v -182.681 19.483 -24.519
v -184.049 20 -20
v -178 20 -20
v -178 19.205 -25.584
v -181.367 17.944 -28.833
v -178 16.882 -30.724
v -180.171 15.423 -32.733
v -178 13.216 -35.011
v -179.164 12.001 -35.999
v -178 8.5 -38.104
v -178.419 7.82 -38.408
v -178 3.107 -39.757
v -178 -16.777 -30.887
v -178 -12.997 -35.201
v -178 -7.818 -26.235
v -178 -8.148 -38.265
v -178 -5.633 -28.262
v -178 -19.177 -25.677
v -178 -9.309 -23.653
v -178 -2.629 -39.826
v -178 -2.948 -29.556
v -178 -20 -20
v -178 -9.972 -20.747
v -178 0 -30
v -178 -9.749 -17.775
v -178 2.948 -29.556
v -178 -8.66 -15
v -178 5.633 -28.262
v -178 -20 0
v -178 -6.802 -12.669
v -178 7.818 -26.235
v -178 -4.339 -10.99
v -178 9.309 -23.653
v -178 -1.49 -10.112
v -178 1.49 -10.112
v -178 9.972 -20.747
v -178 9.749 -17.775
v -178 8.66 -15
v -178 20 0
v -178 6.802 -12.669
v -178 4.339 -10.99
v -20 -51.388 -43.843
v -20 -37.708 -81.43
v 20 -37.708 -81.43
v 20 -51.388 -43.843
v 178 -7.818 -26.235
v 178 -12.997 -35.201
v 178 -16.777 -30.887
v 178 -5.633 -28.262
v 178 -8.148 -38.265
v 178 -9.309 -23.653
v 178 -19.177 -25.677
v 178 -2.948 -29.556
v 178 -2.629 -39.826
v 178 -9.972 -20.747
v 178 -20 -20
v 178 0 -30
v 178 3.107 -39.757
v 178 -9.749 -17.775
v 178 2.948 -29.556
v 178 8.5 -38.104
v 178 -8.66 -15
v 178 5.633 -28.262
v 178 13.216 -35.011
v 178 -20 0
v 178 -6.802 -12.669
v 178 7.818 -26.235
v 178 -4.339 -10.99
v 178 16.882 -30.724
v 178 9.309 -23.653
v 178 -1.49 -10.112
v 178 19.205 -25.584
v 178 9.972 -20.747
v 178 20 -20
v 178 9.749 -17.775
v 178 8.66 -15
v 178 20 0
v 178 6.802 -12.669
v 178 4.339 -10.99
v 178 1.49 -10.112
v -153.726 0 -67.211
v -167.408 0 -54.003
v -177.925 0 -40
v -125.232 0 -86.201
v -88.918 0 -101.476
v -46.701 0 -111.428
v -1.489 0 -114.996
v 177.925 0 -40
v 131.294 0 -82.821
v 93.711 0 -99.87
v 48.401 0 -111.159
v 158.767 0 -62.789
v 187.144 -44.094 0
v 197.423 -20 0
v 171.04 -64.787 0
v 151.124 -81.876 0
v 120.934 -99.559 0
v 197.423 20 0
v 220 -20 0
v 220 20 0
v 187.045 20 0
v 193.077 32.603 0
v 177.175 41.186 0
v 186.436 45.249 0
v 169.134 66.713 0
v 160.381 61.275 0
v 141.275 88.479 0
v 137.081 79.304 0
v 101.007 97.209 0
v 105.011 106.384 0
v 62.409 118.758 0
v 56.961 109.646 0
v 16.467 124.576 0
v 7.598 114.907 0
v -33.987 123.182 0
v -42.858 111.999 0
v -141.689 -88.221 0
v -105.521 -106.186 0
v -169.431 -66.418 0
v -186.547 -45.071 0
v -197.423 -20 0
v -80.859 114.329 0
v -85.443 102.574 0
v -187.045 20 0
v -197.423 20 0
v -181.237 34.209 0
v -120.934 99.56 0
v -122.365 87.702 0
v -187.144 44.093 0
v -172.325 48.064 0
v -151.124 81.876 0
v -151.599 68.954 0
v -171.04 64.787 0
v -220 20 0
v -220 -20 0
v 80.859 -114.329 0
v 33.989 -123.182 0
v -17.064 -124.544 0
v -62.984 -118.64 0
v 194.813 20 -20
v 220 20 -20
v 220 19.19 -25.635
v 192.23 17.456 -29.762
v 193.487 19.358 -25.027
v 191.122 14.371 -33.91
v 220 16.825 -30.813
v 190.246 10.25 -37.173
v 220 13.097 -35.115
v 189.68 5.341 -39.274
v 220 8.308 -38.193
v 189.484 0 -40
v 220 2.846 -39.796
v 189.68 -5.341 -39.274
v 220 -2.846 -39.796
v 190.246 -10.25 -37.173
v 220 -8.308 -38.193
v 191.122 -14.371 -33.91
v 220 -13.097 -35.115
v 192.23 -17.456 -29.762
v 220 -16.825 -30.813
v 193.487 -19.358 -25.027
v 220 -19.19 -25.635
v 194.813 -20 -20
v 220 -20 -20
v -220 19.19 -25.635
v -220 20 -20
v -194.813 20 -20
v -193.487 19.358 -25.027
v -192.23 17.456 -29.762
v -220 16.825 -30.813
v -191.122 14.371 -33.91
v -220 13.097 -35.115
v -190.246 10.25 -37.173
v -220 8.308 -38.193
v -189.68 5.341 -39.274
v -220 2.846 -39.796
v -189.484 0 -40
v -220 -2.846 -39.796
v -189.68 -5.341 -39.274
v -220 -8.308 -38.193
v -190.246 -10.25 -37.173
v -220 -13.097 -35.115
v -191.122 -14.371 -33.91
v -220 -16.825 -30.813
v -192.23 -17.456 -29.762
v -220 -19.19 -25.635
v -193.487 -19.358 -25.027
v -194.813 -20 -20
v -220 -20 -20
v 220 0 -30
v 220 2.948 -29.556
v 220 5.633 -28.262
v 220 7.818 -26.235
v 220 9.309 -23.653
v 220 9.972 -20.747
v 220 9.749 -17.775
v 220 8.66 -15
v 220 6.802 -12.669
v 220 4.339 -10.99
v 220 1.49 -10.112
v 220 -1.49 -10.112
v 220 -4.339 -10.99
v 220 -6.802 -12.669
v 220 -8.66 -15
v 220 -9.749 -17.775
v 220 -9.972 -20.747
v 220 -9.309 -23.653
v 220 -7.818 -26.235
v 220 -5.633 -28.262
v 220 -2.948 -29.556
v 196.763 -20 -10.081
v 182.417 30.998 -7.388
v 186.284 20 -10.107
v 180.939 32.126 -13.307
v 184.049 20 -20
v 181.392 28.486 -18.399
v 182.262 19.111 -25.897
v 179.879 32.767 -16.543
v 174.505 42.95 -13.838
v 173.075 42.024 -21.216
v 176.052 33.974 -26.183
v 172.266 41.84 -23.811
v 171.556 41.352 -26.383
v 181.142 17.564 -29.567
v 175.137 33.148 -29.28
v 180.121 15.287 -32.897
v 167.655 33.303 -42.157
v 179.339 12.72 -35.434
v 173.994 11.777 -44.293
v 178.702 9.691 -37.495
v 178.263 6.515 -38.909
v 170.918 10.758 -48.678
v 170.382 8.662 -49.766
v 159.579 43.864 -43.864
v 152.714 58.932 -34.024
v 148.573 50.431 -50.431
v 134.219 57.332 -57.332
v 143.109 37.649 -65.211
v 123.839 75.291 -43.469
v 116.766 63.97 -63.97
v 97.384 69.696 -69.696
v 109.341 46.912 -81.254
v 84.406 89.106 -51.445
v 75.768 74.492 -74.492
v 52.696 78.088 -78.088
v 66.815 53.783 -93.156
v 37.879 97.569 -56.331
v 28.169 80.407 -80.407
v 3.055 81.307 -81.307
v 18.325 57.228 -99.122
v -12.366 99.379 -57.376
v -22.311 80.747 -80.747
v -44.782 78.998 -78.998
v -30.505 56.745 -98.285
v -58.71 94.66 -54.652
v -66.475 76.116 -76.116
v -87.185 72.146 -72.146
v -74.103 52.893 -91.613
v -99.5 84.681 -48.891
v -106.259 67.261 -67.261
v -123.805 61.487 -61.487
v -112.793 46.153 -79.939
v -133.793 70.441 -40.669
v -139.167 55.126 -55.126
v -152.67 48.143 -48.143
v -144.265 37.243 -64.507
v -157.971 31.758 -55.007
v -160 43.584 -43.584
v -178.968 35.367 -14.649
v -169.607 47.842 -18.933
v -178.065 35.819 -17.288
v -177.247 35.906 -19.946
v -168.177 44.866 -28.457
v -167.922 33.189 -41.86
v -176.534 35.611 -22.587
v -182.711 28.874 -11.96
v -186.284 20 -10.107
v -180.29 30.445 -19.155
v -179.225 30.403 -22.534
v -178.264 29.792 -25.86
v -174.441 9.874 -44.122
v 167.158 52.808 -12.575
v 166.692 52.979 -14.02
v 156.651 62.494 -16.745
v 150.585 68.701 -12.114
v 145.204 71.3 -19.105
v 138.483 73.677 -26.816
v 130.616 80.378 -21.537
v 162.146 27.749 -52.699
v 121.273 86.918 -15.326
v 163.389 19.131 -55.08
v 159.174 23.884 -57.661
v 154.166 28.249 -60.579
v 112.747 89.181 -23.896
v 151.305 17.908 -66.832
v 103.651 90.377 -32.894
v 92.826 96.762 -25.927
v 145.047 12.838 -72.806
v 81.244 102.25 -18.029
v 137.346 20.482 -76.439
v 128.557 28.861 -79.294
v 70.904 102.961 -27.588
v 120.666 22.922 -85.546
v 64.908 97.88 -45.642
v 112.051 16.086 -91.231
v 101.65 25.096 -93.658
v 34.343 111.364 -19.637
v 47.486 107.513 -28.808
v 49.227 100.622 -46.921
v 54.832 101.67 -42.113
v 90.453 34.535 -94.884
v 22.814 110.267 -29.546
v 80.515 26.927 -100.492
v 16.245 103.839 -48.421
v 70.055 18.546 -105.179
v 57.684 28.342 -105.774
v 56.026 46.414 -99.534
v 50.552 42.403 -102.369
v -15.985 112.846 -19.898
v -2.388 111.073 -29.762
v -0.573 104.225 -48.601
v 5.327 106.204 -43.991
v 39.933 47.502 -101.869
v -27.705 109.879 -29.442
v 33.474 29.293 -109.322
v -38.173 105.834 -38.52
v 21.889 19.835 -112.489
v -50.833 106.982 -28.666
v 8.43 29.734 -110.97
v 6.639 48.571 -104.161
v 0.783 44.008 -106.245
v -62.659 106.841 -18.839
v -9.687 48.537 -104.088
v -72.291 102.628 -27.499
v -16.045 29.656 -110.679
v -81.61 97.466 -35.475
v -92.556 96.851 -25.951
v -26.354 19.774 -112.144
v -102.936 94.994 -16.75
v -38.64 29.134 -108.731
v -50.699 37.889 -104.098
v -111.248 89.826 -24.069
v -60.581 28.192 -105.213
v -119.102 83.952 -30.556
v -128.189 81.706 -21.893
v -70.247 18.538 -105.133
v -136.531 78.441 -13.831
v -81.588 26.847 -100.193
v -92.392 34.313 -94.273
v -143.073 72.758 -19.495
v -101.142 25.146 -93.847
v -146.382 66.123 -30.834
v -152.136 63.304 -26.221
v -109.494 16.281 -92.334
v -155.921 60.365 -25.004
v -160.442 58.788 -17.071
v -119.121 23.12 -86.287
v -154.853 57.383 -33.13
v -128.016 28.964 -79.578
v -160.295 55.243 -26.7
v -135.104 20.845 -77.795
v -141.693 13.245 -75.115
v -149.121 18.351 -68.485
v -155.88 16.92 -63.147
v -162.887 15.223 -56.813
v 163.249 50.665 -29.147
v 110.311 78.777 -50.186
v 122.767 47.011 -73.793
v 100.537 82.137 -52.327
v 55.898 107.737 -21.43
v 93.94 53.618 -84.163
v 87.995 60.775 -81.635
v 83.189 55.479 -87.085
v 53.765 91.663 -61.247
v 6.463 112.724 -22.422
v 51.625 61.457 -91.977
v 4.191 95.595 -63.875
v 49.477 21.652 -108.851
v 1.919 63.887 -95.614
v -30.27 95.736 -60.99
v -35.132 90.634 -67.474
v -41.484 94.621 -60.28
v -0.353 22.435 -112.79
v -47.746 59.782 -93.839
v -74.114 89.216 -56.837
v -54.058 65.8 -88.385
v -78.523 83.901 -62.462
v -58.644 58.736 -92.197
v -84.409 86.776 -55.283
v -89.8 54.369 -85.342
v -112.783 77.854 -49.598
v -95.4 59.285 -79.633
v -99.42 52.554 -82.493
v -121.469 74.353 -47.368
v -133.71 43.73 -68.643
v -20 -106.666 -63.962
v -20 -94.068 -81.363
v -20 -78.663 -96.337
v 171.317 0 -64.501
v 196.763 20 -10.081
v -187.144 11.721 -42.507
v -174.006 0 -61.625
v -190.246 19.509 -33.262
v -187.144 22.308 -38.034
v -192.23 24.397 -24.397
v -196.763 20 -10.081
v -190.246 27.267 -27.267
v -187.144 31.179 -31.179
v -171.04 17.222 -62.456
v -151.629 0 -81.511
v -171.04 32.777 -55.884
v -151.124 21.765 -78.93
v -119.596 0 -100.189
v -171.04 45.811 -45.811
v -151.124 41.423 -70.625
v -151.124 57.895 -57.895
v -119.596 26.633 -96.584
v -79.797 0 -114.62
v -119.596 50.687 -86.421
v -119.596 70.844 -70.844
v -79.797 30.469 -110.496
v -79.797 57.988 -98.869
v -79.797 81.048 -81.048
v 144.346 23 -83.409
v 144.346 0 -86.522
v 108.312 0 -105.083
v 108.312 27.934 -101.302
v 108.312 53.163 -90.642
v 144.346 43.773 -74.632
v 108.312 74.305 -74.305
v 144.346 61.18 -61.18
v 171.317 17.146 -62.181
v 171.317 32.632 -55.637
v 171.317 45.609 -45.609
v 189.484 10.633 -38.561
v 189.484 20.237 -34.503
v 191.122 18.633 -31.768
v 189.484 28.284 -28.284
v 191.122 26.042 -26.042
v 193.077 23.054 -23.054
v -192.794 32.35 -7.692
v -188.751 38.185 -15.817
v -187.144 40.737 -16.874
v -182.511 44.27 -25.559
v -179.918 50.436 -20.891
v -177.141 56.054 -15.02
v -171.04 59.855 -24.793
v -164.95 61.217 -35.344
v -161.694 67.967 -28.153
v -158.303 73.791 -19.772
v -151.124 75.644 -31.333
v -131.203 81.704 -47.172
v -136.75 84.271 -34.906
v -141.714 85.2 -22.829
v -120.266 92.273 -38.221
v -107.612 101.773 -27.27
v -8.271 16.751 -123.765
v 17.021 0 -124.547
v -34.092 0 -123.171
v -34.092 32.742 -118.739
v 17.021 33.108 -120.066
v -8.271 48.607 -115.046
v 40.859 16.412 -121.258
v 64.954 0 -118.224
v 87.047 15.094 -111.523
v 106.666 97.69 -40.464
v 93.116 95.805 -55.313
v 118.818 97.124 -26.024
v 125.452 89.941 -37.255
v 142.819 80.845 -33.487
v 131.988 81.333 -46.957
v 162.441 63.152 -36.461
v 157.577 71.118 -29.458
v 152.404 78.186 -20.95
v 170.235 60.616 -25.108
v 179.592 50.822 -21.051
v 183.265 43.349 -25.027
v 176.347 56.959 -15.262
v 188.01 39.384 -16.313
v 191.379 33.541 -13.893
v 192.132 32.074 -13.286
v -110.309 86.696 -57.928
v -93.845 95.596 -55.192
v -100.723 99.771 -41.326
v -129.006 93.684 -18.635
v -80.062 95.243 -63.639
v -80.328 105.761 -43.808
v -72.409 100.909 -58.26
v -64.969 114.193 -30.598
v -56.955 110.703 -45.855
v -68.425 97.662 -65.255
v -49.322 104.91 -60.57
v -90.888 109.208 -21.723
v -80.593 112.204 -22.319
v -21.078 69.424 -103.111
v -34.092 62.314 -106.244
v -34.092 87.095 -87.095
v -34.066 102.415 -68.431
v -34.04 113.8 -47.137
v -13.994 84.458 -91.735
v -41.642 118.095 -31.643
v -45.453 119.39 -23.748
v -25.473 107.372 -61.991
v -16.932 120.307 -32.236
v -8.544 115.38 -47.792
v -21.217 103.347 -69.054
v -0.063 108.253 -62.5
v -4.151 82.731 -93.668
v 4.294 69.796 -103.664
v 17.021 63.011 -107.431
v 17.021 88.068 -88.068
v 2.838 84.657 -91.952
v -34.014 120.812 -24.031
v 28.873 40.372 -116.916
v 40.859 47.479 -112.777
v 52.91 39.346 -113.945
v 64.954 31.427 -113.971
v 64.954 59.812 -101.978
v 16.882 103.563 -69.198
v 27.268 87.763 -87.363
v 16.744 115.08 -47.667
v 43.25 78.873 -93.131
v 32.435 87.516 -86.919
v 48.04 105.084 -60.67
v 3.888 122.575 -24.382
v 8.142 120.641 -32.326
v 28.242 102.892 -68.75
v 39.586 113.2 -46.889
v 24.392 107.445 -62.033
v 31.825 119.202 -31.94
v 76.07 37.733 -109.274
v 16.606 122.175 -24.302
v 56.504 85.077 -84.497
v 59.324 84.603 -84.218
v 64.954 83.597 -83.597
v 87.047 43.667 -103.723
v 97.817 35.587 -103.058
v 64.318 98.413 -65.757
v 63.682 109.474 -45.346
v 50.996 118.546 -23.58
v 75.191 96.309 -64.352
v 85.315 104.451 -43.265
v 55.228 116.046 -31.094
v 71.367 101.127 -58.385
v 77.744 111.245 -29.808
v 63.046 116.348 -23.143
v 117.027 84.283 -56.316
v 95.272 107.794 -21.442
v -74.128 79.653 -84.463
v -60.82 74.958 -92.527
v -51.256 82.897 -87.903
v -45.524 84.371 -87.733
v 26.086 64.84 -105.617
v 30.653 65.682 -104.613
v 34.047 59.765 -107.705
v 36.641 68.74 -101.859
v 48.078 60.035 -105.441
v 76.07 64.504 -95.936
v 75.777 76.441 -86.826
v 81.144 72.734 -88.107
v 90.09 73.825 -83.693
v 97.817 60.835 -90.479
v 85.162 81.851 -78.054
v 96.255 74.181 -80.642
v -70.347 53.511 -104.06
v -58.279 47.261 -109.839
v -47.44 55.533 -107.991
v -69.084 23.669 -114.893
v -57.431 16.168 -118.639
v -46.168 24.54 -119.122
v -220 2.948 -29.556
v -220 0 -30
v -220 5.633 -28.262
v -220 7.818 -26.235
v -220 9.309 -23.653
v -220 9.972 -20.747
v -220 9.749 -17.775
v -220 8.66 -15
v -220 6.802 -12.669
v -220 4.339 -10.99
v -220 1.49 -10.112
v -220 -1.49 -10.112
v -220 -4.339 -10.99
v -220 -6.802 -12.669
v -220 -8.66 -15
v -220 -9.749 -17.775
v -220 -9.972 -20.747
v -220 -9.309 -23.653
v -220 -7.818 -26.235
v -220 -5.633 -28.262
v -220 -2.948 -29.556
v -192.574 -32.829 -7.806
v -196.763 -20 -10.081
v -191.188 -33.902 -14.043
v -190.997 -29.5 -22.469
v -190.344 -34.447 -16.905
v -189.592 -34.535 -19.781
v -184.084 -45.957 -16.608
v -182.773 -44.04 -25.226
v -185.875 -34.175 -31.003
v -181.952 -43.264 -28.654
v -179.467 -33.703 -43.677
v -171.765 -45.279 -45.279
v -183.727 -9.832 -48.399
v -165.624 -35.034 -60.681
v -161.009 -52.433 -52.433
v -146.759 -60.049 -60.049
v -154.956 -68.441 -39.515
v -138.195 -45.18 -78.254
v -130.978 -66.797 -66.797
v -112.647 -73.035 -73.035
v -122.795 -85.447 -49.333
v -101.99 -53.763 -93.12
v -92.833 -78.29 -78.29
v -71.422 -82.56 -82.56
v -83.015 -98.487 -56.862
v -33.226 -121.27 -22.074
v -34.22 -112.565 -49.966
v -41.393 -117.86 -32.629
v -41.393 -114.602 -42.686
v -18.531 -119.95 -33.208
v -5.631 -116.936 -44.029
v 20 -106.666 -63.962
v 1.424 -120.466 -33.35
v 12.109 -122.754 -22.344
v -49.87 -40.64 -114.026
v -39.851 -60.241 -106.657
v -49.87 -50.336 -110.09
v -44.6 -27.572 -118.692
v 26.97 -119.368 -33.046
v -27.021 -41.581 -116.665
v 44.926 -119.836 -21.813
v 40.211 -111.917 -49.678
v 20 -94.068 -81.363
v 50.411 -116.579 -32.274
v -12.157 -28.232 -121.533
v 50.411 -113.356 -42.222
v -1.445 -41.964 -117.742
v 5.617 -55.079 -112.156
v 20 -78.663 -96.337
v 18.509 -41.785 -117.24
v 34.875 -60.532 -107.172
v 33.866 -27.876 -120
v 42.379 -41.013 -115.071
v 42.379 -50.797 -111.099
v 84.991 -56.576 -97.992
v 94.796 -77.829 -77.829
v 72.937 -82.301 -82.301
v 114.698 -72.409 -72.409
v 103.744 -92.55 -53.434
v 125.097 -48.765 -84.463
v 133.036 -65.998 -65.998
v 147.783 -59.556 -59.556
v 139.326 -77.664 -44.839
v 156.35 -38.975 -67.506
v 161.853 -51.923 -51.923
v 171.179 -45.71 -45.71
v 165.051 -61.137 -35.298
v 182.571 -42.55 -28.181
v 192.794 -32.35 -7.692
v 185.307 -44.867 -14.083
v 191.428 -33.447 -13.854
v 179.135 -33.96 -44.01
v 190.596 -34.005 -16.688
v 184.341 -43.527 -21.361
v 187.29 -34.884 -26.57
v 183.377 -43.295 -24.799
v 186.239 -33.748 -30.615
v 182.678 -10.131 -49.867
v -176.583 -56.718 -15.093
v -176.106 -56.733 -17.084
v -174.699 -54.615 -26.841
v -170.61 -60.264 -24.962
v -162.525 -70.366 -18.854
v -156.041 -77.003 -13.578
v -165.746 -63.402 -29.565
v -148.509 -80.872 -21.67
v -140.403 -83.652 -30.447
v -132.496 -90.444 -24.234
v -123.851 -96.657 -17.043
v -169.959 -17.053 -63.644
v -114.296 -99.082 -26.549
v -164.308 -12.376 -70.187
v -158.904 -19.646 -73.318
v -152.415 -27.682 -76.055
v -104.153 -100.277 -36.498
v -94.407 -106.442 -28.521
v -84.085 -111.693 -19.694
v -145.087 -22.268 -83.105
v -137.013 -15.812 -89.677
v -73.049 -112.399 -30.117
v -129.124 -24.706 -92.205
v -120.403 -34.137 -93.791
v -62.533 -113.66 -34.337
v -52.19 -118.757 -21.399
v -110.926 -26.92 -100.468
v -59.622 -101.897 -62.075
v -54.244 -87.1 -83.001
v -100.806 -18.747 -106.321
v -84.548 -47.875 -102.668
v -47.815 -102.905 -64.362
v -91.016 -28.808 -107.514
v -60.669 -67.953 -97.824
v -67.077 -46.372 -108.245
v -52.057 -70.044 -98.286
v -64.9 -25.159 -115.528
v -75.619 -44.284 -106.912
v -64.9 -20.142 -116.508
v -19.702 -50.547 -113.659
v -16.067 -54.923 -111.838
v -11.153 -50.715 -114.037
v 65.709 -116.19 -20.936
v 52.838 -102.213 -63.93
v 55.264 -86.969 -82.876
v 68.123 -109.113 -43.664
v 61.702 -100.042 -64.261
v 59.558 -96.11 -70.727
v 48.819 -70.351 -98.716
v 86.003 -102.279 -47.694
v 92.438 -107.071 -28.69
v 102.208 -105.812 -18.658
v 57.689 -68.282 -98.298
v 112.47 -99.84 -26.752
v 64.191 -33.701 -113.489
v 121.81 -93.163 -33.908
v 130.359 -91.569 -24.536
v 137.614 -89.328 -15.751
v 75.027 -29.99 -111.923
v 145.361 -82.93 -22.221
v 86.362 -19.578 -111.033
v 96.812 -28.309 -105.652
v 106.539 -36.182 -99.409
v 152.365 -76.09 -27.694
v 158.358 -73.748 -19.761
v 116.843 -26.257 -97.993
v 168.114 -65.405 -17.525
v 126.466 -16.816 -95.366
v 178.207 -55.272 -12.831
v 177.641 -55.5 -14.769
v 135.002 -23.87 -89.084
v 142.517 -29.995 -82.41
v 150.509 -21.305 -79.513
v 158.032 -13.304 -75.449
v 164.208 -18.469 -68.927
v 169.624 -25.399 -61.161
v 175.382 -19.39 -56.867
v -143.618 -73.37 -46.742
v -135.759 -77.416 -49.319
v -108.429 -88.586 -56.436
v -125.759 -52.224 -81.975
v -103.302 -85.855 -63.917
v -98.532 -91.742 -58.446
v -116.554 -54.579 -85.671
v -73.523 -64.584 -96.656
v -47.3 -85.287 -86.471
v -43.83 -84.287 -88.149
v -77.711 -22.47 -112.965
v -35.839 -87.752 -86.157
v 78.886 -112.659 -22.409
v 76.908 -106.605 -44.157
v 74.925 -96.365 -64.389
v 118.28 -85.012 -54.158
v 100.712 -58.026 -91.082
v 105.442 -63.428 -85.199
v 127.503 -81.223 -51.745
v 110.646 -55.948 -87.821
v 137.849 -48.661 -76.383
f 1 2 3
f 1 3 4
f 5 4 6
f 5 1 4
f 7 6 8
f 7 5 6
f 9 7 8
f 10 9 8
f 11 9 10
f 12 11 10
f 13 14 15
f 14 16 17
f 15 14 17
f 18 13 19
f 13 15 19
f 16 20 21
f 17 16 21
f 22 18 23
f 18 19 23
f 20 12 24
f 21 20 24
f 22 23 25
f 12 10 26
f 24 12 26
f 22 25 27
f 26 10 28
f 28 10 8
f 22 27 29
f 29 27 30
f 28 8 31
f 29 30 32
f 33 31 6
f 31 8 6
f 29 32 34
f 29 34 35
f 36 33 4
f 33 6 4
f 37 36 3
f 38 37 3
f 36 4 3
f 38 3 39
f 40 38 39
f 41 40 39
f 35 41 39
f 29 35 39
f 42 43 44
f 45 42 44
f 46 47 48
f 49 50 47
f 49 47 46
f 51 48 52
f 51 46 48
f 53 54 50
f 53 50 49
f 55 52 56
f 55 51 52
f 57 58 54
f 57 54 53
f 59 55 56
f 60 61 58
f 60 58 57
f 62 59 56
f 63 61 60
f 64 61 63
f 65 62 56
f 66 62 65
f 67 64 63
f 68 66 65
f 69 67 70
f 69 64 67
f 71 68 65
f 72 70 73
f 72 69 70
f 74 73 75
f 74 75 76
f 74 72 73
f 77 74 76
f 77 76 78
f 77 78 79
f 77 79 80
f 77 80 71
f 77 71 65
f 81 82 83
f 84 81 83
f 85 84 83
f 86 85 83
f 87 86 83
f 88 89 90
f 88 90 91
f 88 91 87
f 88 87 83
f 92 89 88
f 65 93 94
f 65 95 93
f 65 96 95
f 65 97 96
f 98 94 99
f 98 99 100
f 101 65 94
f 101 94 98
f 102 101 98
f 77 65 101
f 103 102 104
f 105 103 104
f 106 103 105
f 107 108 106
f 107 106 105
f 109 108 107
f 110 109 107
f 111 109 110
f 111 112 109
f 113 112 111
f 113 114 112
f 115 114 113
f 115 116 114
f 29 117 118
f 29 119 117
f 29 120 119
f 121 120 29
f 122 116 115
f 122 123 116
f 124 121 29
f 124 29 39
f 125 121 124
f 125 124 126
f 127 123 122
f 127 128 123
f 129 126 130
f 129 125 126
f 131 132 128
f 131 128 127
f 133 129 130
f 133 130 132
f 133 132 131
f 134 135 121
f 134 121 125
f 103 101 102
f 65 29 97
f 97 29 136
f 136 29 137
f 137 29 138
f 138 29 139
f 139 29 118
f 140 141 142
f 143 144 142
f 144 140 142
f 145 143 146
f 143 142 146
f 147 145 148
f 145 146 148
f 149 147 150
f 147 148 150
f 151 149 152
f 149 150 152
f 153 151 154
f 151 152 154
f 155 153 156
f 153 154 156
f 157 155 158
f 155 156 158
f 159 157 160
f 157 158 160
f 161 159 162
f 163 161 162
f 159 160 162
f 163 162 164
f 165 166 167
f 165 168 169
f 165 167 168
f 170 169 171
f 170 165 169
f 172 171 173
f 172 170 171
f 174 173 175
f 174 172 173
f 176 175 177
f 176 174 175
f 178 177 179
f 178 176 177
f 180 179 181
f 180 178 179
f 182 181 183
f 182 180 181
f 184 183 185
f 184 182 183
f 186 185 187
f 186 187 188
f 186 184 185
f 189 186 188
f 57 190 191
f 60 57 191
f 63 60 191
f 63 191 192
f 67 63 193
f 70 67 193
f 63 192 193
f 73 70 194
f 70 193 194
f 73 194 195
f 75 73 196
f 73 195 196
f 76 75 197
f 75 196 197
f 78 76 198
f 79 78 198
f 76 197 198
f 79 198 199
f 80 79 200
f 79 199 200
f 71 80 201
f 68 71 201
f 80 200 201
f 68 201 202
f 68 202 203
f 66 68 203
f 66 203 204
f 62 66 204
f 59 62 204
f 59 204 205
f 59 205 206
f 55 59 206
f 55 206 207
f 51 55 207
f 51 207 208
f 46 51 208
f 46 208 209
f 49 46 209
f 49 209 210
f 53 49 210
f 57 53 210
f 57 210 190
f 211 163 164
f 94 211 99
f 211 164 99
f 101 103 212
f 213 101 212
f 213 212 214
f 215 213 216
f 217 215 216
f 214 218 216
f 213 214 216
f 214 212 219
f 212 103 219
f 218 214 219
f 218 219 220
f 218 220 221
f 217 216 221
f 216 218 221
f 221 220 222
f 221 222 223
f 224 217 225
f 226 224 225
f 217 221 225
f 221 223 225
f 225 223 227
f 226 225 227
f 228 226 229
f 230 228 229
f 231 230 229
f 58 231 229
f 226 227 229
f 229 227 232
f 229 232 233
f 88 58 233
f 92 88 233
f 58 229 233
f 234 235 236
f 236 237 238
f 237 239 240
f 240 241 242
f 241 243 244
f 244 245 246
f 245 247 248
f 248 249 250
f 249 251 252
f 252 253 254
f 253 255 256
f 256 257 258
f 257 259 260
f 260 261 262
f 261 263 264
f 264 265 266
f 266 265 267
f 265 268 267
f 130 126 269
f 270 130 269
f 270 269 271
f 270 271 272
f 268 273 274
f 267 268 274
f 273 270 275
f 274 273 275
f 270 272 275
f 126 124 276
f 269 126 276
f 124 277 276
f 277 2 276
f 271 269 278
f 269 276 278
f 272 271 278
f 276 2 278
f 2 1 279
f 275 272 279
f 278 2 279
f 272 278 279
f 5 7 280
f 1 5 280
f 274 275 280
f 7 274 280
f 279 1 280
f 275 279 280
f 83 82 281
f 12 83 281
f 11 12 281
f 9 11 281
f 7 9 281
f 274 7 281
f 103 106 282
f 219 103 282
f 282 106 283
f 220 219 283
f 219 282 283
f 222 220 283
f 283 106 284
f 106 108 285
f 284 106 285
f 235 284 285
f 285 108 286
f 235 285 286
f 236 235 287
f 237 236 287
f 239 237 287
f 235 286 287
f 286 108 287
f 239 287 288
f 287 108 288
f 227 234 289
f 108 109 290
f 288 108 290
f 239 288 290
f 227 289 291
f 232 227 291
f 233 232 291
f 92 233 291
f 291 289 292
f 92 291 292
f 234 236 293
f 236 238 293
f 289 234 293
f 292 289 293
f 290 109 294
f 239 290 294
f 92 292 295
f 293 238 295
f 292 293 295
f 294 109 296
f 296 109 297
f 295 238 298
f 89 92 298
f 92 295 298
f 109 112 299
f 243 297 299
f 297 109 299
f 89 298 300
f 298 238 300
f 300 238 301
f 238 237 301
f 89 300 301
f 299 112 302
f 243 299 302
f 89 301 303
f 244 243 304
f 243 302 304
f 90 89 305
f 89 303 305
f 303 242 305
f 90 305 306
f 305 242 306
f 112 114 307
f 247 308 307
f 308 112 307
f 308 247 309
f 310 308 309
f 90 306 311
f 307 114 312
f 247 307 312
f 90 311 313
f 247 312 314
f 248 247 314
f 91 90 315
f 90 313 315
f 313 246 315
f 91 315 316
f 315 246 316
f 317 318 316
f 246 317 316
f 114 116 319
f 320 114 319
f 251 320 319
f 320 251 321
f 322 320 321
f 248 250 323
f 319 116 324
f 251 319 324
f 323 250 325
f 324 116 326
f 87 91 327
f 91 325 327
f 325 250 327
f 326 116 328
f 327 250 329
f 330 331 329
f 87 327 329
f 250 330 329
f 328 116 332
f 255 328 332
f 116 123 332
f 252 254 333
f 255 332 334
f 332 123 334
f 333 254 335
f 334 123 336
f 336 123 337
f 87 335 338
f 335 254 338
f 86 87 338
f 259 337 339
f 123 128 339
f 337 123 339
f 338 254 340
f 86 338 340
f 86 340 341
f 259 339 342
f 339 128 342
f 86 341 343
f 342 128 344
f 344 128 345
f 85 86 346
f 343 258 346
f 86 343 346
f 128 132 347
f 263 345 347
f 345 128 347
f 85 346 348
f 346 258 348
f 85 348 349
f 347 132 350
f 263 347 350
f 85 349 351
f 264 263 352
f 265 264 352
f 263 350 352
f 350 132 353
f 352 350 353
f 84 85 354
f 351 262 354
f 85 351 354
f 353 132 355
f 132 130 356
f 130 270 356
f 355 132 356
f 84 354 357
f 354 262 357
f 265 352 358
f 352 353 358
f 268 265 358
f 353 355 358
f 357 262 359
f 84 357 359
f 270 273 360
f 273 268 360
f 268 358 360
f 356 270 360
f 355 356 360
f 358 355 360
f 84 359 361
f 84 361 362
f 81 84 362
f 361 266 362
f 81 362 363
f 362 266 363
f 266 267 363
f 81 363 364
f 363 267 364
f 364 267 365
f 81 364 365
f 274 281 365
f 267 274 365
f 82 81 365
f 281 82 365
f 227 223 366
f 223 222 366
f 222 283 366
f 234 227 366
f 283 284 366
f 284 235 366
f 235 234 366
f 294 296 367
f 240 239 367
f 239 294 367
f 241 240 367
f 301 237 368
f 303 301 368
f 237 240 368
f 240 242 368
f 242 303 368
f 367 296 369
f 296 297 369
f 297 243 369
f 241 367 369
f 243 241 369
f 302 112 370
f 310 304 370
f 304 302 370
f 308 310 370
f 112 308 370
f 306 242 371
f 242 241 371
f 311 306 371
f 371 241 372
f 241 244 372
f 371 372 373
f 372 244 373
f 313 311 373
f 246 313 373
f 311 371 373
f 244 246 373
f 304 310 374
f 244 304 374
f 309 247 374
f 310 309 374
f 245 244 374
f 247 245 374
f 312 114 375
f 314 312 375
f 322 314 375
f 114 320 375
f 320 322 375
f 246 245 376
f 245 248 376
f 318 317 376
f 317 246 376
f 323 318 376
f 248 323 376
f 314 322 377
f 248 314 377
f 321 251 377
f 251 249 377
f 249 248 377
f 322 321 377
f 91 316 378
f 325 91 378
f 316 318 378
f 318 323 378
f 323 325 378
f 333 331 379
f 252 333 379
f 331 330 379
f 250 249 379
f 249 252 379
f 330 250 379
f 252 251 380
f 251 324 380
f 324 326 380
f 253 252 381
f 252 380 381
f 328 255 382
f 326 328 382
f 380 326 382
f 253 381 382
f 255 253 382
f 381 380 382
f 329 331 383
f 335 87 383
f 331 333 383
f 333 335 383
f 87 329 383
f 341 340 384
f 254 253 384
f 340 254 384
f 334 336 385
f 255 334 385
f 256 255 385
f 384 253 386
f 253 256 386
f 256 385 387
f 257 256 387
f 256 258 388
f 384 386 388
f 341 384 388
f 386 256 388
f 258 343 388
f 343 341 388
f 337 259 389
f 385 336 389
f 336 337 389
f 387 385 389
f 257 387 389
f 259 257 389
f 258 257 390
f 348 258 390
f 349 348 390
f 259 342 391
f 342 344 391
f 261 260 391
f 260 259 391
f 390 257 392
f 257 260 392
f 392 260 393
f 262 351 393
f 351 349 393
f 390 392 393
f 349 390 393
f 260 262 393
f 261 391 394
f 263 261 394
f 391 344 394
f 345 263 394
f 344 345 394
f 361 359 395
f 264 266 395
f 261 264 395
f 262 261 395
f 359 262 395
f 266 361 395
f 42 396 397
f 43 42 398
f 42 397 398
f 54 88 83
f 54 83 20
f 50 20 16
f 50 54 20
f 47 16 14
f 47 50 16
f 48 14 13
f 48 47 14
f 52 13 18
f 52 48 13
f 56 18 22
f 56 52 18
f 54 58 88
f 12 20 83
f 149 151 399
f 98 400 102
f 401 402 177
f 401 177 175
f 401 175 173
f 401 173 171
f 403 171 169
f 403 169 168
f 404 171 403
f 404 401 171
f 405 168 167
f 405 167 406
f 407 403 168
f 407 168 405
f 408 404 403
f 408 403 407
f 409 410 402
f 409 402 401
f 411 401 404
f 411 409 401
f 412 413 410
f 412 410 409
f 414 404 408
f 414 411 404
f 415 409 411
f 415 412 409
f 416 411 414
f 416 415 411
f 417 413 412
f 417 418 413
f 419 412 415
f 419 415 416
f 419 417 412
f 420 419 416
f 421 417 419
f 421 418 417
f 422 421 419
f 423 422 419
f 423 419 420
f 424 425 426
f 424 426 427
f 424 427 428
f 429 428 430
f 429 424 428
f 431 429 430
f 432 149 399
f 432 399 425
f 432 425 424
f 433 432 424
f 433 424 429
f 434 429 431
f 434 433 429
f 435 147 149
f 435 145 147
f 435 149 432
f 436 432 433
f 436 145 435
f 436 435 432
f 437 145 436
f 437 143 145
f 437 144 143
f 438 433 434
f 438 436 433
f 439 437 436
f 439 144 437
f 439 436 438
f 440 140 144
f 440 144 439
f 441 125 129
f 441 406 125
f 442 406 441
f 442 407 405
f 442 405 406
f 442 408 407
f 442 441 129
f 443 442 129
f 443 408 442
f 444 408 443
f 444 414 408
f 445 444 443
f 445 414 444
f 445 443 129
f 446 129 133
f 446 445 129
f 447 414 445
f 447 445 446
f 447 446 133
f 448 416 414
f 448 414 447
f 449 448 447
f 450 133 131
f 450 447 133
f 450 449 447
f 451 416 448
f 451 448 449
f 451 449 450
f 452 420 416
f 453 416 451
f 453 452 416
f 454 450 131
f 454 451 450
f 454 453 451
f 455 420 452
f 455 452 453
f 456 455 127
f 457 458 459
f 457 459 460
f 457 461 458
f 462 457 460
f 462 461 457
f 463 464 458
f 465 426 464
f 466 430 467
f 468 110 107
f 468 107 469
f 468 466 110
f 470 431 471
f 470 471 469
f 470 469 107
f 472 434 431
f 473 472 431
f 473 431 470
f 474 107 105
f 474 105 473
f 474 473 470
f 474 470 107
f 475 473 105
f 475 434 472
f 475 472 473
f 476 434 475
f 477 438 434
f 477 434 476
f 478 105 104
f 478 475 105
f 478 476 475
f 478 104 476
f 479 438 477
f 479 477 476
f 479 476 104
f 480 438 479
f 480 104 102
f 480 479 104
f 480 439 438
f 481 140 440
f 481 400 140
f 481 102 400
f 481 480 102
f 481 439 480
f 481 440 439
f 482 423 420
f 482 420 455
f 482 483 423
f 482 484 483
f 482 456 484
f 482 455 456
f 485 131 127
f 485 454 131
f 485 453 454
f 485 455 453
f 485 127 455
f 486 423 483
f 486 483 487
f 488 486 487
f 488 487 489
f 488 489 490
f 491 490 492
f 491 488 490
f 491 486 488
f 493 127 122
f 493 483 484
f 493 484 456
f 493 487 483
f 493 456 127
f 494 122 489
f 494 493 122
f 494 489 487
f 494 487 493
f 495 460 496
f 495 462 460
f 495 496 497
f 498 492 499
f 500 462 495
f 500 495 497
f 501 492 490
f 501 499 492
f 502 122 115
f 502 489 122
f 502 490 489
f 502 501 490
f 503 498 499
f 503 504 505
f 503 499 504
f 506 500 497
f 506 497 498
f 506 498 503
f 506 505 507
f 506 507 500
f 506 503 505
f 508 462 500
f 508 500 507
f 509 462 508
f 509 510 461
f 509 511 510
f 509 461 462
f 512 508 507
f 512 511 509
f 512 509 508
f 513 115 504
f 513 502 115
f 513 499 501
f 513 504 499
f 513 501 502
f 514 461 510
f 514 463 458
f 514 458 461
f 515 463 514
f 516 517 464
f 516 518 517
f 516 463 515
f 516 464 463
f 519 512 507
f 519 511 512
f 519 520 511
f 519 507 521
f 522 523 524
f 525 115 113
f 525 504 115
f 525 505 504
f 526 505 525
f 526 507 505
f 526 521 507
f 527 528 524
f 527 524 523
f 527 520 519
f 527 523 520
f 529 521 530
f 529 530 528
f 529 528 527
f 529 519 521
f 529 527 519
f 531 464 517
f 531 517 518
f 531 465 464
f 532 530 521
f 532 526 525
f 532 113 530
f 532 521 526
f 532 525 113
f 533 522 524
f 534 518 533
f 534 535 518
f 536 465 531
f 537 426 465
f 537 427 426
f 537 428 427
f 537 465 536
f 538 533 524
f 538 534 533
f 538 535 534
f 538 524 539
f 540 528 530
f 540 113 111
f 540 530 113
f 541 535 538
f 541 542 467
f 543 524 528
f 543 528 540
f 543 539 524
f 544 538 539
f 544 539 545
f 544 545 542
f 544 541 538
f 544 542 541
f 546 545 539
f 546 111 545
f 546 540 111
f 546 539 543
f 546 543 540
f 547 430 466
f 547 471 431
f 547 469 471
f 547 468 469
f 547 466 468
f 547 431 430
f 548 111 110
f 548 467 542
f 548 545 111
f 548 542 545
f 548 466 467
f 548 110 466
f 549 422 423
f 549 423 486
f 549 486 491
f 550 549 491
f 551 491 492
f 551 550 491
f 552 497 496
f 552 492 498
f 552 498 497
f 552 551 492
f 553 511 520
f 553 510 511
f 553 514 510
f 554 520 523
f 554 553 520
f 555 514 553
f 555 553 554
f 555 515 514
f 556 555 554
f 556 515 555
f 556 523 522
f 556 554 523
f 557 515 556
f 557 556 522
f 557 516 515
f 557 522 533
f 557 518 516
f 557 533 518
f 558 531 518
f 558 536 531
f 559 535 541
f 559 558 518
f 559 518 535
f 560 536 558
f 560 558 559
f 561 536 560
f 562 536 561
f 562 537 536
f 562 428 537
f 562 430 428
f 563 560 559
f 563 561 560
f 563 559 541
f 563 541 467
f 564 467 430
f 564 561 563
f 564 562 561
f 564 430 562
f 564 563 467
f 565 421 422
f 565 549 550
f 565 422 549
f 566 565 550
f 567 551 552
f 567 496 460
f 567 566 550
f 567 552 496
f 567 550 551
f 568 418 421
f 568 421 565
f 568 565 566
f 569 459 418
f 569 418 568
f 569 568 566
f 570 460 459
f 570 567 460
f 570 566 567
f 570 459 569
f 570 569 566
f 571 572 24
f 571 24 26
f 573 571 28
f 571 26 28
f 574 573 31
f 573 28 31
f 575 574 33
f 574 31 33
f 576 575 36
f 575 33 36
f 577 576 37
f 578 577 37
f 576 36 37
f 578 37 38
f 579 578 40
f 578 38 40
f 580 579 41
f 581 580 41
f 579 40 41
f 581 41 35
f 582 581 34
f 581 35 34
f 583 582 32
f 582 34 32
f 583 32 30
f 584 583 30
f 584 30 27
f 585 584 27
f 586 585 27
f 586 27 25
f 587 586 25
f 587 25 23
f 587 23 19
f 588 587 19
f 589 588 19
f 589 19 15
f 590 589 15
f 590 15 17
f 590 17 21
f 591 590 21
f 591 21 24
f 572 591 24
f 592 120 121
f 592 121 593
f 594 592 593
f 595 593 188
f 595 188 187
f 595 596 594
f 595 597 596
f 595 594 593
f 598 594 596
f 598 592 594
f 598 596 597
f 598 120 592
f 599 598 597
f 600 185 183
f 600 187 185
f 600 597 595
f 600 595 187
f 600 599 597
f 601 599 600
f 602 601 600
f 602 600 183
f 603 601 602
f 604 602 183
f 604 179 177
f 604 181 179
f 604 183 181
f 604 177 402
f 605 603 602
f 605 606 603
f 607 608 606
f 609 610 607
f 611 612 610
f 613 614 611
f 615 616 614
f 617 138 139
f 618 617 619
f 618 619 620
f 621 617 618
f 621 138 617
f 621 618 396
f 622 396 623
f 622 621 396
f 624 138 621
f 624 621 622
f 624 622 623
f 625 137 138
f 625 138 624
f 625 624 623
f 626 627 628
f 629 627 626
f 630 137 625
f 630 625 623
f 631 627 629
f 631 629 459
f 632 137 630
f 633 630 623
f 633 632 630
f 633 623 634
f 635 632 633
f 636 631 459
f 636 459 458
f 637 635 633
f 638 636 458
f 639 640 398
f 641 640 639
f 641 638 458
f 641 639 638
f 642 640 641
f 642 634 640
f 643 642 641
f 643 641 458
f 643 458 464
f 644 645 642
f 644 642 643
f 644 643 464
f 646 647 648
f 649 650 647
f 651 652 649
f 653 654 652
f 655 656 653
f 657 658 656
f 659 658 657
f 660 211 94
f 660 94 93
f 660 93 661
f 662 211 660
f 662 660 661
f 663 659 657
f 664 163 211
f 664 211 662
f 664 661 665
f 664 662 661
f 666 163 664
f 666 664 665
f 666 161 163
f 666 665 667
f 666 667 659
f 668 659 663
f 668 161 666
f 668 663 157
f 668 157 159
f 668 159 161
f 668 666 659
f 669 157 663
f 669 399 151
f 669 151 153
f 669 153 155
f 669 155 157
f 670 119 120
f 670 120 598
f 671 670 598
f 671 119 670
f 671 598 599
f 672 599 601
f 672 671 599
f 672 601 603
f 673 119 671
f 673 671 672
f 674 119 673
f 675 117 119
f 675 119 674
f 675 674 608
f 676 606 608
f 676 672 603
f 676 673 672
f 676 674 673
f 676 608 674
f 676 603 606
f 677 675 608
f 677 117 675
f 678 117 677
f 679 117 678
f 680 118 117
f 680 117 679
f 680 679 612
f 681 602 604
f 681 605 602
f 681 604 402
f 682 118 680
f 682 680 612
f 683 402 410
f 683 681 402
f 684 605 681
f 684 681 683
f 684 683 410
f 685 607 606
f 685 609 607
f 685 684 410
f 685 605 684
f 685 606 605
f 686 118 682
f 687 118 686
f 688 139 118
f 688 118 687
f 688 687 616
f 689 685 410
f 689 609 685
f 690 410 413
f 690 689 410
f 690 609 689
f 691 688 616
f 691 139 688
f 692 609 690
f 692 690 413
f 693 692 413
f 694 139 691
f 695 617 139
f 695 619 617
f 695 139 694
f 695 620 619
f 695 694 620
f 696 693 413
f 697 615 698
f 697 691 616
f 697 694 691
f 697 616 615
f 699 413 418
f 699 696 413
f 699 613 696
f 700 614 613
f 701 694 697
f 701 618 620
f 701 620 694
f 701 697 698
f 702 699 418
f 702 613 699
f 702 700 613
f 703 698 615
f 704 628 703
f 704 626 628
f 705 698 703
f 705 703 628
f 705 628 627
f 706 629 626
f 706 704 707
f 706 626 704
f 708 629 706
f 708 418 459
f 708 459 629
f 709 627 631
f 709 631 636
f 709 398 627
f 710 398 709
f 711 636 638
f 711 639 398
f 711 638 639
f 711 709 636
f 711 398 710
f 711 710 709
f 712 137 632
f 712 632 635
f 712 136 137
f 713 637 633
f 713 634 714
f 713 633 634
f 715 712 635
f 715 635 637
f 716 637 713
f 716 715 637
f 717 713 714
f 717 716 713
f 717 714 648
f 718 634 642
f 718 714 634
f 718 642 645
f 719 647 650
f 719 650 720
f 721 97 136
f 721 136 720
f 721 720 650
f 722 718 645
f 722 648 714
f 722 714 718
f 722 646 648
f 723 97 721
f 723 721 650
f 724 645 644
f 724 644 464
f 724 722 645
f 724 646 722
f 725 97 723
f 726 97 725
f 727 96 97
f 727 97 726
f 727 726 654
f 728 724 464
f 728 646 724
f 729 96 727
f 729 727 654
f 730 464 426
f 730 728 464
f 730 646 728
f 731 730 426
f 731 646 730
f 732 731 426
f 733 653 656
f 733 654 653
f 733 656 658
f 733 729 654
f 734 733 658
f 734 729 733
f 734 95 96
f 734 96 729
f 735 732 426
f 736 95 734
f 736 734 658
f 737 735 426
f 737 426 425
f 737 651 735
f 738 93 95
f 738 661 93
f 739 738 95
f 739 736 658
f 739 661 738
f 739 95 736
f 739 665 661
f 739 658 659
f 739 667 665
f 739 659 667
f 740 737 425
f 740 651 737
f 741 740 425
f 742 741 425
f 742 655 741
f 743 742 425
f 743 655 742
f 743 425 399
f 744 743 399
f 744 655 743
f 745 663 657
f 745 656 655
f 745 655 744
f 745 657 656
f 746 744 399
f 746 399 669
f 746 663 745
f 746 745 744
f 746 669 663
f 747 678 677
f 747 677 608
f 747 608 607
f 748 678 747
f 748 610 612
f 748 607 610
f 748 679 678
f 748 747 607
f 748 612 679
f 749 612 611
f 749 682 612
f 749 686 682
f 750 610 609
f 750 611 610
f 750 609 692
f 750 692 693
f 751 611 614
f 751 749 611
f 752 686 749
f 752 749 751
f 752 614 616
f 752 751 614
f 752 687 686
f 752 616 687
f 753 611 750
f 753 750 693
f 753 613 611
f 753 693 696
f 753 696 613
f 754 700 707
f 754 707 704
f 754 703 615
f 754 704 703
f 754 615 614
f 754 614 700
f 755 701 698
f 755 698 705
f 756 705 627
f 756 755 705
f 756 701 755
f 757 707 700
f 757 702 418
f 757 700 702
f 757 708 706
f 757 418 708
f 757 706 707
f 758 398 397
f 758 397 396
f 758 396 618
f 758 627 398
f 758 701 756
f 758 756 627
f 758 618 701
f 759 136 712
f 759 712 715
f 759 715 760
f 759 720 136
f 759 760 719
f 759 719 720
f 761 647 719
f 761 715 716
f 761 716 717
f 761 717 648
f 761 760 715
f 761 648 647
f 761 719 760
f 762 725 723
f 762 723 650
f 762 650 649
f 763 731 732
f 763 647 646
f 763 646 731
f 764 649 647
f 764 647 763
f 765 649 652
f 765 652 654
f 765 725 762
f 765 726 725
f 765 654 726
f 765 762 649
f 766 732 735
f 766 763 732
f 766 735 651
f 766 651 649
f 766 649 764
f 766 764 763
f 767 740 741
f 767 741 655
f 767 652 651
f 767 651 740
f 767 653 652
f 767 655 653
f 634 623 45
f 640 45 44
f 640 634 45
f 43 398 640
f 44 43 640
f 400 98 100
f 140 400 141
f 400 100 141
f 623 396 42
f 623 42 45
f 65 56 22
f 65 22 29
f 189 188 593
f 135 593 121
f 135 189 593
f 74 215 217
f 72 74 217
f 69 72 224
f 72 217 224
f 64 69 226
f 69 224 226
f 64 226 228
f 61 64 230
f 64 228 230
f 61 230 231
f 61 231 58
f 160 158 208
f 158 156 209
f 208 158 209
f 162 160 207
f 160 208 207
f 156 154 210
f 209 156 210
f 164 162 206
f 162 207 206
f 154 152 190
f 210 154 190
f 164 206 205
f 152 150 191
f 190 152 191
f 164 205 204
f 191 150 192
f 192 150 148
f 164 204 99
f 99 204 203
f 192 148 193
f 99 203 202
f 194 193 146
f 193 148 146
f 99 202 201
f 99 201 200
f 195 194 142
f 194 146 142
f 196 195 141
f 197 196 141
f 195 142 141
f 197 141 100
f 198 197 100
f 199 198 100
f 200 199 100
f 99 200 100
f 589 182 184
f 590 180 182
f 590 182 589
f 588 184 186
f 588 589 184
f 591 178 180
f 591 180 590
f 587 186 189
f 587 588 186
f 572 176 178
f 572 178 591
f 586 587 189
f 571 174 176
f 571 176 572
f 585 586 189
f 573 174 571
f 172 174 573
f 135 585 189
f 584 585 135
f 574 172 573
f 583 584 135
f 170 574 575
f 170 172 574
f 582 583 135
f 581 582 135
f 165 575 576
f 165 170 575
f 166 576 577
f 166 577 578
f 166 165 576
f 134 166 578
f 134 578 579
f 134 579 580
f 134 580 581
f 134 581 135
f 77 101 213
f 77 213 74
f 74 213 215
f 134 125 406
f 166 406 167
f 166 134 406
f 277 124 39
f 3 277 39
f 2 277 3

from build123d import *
from build123d.topology import SkipClean

# Parameters (mm, degrees)
SKETCH_3_W          = 40
SKETCH_3_H          = 40
CUT_EXTRUDE_1_DEPTH = 70
CUT_REVOLVE_1_ANGLE = 90
CUT_EXTRUDE_2_DEPTH = 456.68629575
EXTRUDE_1_DEPTH     = 42
SKETCH_7_R          = 10
CUT_EXTRUDE_3_DEPTH = 440


with BuildPart() as part:
    # 草图1 → 旋转3 (revolve)
    with SkipClean():  # the faces are left unmerged after this step: merging them gives an invalid solid
        with BuildSketch(Plane(origin=(0, 0, 0), x_dir=(1, 0, 0), z_dir=(0, 1, 0))):
            with BuildLine():
                add(Edge.make_bspline(
                    [(200, 0), (200, 125), (0, 125), (-200, 125), (-200, 0)],
                    knots=[0, 0, 0, 1.570796327, 1.570796327, 3.141592654, 3.141592654, 3.141592654], degree=2, weights=[1, 0.707106781, 1, 0.707106781, 1]))
                Line((-200, 0), (200, 0))
            make_face()
            with BuildLine():
                Line((200, 0), (-200, 0))
                add(Edge.make_bspline(
                    [(-200, 0), (-200, -125), (0, -125), (200, -125), (200, 0)],
                    knots=[3.141592654, 3.141592654, 3.141592654, 4.71238898, 4.71238898, 6.283185307, 6.283185307, 6.283185307], degree=2, weights=[1, 0.707106781, 1, 0.707106781, 1]))
            make_face()
        revolve(axis=Axis((-376.776806715, 0, 0), (1, 0, 0)))
    add(part.part.scale(1), mode=Mode.REPLACE)  # the faces are merged on a copy

    # Surface Cut 1
    split(bisect_by=Plane.XY, keep=Keep.BOTTOM)

    # 草图3 → 切除-拉伸1 (cut)
    with BuildSketch(Plane(origin=(0, -125.246294878, -45.585923288), x_dir=(1, 0, 0), z_dir=(0, 0.9396926207859081, 0.34202014332566943))):
        with Locations((0, 43.622733675)):
            Rectangle(SKETCH_3_W, SKETCH_3_H)
    extrude(amount=CUT_EXTRUDE_1_DEPTH, mode=Mode.SUBTRACT)

    # 草图4 → 切除-旋转1 (revolve, cut)
    with BuildSketch(Plane.XY):
        with BuildLine():
            Line((-189.264857791, 10), (189.264857791, 10))
            add(Edge.make_bspline(
                [(189.264857791, 10), (189.01661408, 11.685645813), (188.399842232, 15.02459428), (186.660672029, 21.717695752), (183.544014825, 30.028723701), (178.280438028, 39.871100011), (169.238112825, 52.698753606), (154.190025082, 67.938441209), (130.617285564, 84.133702491), (102.331625356, 97.503941795), (70.346299789, 107.469826997), (35.819572857, 113.615740598), (0, 115.692129701), (-35.819572857, 113.615740598), (-70.346299789, 107.469826997), (-102.331625356, 97.503941795), (-130.617285564, 84.133702491), (-154.190025082, 67.938441209), (-169.238112825, 52.698753606), (-178.280438028, 39.871100011), (-183.544014825, 30.028723701), (-186.660672029, 21.717695752), (-188.399842232, 15.02459428), (-189.01661408, 11.685645813), (-189.264857791, 10)],
                knots=[0.091784635, 0.091784635, 0.091784635, 0.091784635, 0.13800375, 0.184222866, 0.276661096, 0.369099327, 0.461537558, 0.646414019, 0.831290481, 1.016166942, 1.201043404, 1.385919865, 1.570796327, 1.755672788, 1.94054925, 2.125425711, 2.310302173, 2.495178634, 2.680055096, 2.772493326, 2.864931557, 2.957369788, 3.003588903, 3.049808019, 3.049808019, 3.049808019, 3.049808019], degree=3))
        make_face()
    revolve(axis=Axis((-200, 0, 0), (-1, 0, 0)), revolution_arc=CUT_REVOLVE_1_ANGLE, mode=Mode.SUBTRACT)

    # 草图5 → 切除-拉伸2 (cut, through all)
    with BuildSketch(Plane(origin=(220, 0, 0), x_dir=(0, 0, -1), z_dir=(1, 0, 0))):
        with BuildLine():
            ThreePointArc((20, 20), (40, 0), (20, -20))
            Line((20, -20), (0, -20))
            Line((0, -20), (0, 20))
            Line((0, 20), (20, 20))
        make_face()
    extrude(amount=-CUT_EXTRUDE_2_DEPTH, mode=Mode.SUBTRACT)

    # 草图6 → 凸台-拉伸1 (add)
    with BuildSketch(Plane(origin=(220, 0, 0), x_dir=(0, 0, -1), z_dir=(1, 0, 0))):
        with BuildLine():
            Line((20, -20), (0, -20))
            Line((0, -20), (0, 20))
            Line((0, 20), (20, 20))
            ThreePointArc((20, 20), (40, 0), (20, -20))
        make_face()
    extrude_1 = extrude(amount=-EXTRUDE_1_DEPTH)

    # 镜向1: 凸台-拉伸1 across plane
    add(extrude_1.mirror(Plane(origin=(0, 0, 0), x_dir=(0, 0, 1), z_dir=(1, 0, 0))))

    # 草图7 → 切除-拉伸3 (cut)
    with BuildSketch(Plane(origin=(220, 0, 0), x_dir=(0, 0, -1), z_dir=(1, 0, 0))):
        with Locations((20, 0)):
            Circle(SKETCH_7_R)
    extrude(amount=-CUT_EXTRUDE_3_DEPTH, mode=Mode.SUBTRACT)


solid = part.part
